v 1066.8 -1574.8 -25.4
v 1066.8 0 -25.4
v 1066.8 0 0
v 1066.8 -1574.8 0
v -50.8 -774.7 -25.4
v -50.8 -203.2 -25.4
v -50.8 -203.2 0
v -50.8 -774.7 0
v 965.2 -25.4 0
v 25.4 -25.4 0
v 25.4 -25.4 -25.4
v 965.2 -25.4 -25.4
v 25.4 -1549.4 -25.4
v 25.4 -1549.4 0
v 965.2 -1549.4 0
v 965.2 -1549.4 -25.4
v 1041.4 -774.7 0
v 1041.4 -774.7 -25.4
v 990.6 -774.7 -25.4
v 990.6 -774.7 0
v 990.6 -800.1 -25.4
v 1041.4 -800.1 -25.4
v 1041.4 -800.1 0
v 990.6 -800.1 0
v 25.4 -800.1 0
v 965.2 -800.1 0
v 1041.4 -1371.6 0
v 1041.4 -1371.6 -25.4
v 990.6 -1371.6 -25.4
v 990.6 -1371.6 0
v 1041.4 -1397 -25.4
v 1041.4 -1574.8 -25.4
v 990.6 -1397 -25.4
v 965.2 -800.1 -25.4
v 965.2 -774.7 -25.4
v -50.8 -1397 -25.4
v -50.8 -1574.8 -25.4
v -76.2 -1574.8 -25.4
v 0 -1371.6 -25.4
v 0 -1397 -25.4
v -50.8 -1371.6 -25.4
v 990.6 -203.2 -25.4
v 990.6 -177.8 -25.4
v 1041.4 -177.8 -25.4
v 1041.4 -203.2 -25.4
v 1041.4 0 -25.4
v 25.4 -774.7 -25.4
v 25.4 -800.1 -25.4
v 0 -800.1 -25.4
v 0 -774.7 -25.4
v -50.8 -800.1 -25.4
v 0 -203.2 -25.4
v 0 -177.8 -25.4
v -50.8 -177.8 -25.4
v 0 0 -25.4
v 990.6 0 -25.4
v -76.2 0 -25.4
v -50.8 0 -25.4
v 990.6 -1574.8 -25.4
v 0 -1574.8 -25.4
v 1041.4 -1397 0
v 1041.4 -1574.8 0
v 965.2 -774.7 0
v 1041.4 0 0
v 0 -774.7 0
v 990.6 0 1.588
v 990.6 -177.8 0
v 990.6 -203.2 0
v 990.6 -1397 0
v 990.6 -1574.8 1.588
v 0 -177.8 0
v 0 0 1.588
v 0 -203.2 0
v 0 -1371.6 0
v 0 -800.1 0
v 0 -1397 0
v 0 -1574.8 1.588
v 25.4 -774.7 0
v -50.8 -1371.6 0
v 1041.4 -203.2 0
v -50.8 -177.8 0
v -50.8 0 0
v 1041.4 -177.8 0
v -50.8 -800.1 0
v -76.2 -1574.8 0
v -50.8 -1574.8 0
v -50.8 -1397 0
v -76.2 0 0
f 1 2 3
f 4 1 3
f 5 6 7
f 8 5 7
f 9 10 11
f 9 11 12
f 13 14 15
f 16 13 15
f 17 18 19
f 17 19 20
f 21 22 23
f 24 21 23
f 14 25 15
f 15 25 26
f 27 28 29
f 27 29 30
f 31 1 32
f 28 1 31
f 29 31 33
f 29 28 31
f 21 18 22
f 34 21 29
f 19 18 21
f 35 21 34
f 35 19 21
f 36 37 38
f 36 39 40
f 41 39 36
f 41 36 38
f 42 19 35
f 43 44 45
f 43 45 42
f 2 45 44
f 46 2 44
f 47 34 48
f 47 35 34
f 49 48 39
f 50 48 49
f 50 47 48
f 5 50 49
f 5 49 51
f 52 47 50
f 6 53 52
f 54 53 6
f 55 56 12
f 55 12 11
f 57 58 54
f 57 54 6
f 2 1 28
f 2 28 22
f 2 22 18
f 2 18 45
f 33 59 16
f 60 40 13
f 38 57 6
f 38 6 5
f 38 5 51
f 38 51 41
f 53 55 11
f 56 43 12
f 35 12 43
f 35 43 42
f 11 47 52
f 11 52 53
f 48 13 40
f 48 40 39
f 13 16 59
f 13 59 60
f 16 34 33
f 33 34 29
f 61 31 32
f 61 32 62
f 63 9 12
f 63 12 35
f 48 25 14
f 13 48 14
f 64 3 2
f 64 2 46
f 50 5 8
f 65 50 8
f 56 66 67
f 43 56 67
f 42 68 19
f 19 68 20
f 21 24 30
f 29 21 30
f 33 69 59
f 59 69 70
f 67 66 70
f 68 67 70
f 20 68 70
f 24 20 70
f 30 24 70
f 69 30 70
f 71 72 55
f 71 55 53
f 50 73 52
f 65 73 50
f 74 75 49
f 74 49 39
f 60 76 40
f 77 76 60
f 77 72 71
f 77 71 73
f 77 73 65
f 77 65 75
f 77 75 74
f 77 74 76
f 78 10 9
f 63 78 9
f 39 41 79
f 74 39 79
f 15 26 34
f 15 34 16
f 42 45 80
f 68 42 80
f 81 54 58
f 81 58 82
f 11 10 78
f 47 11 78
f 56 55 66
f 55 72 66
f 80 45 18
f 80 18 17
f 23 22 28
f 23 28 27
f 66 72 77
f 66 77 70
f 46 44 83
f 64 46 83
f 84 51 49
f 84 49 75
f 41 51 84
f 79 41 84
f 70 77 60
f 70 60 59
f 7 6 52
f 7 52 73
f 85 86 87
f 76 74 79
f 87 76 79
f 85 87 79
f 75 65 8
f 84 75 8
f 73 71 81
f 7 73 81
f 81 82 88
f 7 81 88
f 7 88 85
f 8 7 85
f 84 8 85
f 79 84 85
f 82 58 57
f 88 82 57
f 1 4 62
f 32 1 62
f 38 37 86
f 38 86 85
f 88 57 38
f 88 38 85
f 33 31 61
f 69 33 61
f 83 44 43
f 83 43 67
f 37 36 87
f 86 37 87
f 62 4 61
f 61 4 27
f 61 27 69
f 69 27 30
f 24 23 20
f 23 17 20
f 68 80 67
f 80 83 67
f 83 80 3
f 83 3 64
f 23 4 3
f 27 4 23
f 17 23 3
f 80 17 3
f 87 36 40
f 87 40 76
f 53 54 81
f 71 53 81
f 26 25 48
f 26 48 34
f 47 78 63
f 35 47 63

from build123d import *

# Parameters (mm, degrees)
F0_W      = 990.6
F0_H      = 1574.8
F1_DEPTH  = 1.5875
F2_W      = 990.6
F2_H      = 1574.8
F2_W_2    = 939.8
F2_H_2    = 749.3
F3_DEPTH  = 25.4
F4_W      = 25.4
F4_H      = 25.4
F5_DEPTH  = 50.8
F6_W      = 25.4
F6_H      = 25.4
F7_DEPTH  = 1574.8
F8_W      = 25.4
F8_H      = 25.4
F9_DEPTH  = 50.8
F10_W     = 25.4
F10_H     = 25.4
F11_DEPTH = 1574.8


with BuildPart() as f1:
    # F0 (on Top) → F1 (new body)
    with BuildSketch(Plane.XY):
        with Locations((495.3, -787.4)):
            Rectangle(F0_W, F0_H)
    extrude(amount=F1_DEPTH)

    # F2 (on face) → F3 (join)
    with BuildSketch(Plane(origin=(0, 0, 0), x_dir=(1, 0, 0), z_dir=(0, 0, -1))):
        with Locations((495.3, 787.4)):
            Rectangle(F2_W, F2_H)
        with Locations((495.3, 400.05)):
            Rectangle(F2_W_2, F2_H_2, mode=Mode.SUBTRACT)
        with Locations((495.3, 1174.75)):
            Rectangle(F2_W_2, F2_H_2, mode=Mode.SUBTRACT)
    extrude(amount=F3_DEPTH)

    # F4 (on face) → F5 (join)
    with BuildSketch(Plane(origin=(0, 0, 0), x_dir=(0, -1, 0), z_dir=(-1, 0, 0))):
        with Locations((190.5, -12.7)):
            Rectangle(F4_W, F4_H)
        with Locations((787.4, -12.7)):
            Rectangle(F4_W, F4_H)
        with Locations((1384.3, -12.7)):
            Rectangle(F4_W, F4_H)
    extrude(amount=F5_DEPTH)

    # F6 (on face) → F7 (join)
    with BuildSketch(Plane(origin=(0, 0, 0), x_dir=(-1, 0, 0), z_dir=(0, 1, 0))):
        with Locations((63.5, -12.7)):
            Rectangle(F6_W, F6_H)
    extrude(amount=-F7_DEPTH)

    # F8 (on face) → F9 (join)
    with BuildSketch(Plane.YZ.offset(990.6)):
        with Locations((-1384.3, -12.7)):
            Rectangle(F8_W, F8_H)
        with Locations((-787.4, -12.7)):
            Rectangle(F8_W, F8_H)
        with Locations((-190.5, -12.7)):
            Rectangle(F8_W, F8_H)
    extrude(amount=F9_DEPTH)

    # F10 (on face) → F11 (join)
    with BuildSketch(Plane(origin=(0, 0, 0), x_dir=(-1, 0, 0), z_dir=(0, 1, 0))):
        with Locations((-1054.1, -12.7)):
            Rectangle(F10_W, F10_H)
    extrude(amount=-F11_DEPTH)


solid = f1.part
